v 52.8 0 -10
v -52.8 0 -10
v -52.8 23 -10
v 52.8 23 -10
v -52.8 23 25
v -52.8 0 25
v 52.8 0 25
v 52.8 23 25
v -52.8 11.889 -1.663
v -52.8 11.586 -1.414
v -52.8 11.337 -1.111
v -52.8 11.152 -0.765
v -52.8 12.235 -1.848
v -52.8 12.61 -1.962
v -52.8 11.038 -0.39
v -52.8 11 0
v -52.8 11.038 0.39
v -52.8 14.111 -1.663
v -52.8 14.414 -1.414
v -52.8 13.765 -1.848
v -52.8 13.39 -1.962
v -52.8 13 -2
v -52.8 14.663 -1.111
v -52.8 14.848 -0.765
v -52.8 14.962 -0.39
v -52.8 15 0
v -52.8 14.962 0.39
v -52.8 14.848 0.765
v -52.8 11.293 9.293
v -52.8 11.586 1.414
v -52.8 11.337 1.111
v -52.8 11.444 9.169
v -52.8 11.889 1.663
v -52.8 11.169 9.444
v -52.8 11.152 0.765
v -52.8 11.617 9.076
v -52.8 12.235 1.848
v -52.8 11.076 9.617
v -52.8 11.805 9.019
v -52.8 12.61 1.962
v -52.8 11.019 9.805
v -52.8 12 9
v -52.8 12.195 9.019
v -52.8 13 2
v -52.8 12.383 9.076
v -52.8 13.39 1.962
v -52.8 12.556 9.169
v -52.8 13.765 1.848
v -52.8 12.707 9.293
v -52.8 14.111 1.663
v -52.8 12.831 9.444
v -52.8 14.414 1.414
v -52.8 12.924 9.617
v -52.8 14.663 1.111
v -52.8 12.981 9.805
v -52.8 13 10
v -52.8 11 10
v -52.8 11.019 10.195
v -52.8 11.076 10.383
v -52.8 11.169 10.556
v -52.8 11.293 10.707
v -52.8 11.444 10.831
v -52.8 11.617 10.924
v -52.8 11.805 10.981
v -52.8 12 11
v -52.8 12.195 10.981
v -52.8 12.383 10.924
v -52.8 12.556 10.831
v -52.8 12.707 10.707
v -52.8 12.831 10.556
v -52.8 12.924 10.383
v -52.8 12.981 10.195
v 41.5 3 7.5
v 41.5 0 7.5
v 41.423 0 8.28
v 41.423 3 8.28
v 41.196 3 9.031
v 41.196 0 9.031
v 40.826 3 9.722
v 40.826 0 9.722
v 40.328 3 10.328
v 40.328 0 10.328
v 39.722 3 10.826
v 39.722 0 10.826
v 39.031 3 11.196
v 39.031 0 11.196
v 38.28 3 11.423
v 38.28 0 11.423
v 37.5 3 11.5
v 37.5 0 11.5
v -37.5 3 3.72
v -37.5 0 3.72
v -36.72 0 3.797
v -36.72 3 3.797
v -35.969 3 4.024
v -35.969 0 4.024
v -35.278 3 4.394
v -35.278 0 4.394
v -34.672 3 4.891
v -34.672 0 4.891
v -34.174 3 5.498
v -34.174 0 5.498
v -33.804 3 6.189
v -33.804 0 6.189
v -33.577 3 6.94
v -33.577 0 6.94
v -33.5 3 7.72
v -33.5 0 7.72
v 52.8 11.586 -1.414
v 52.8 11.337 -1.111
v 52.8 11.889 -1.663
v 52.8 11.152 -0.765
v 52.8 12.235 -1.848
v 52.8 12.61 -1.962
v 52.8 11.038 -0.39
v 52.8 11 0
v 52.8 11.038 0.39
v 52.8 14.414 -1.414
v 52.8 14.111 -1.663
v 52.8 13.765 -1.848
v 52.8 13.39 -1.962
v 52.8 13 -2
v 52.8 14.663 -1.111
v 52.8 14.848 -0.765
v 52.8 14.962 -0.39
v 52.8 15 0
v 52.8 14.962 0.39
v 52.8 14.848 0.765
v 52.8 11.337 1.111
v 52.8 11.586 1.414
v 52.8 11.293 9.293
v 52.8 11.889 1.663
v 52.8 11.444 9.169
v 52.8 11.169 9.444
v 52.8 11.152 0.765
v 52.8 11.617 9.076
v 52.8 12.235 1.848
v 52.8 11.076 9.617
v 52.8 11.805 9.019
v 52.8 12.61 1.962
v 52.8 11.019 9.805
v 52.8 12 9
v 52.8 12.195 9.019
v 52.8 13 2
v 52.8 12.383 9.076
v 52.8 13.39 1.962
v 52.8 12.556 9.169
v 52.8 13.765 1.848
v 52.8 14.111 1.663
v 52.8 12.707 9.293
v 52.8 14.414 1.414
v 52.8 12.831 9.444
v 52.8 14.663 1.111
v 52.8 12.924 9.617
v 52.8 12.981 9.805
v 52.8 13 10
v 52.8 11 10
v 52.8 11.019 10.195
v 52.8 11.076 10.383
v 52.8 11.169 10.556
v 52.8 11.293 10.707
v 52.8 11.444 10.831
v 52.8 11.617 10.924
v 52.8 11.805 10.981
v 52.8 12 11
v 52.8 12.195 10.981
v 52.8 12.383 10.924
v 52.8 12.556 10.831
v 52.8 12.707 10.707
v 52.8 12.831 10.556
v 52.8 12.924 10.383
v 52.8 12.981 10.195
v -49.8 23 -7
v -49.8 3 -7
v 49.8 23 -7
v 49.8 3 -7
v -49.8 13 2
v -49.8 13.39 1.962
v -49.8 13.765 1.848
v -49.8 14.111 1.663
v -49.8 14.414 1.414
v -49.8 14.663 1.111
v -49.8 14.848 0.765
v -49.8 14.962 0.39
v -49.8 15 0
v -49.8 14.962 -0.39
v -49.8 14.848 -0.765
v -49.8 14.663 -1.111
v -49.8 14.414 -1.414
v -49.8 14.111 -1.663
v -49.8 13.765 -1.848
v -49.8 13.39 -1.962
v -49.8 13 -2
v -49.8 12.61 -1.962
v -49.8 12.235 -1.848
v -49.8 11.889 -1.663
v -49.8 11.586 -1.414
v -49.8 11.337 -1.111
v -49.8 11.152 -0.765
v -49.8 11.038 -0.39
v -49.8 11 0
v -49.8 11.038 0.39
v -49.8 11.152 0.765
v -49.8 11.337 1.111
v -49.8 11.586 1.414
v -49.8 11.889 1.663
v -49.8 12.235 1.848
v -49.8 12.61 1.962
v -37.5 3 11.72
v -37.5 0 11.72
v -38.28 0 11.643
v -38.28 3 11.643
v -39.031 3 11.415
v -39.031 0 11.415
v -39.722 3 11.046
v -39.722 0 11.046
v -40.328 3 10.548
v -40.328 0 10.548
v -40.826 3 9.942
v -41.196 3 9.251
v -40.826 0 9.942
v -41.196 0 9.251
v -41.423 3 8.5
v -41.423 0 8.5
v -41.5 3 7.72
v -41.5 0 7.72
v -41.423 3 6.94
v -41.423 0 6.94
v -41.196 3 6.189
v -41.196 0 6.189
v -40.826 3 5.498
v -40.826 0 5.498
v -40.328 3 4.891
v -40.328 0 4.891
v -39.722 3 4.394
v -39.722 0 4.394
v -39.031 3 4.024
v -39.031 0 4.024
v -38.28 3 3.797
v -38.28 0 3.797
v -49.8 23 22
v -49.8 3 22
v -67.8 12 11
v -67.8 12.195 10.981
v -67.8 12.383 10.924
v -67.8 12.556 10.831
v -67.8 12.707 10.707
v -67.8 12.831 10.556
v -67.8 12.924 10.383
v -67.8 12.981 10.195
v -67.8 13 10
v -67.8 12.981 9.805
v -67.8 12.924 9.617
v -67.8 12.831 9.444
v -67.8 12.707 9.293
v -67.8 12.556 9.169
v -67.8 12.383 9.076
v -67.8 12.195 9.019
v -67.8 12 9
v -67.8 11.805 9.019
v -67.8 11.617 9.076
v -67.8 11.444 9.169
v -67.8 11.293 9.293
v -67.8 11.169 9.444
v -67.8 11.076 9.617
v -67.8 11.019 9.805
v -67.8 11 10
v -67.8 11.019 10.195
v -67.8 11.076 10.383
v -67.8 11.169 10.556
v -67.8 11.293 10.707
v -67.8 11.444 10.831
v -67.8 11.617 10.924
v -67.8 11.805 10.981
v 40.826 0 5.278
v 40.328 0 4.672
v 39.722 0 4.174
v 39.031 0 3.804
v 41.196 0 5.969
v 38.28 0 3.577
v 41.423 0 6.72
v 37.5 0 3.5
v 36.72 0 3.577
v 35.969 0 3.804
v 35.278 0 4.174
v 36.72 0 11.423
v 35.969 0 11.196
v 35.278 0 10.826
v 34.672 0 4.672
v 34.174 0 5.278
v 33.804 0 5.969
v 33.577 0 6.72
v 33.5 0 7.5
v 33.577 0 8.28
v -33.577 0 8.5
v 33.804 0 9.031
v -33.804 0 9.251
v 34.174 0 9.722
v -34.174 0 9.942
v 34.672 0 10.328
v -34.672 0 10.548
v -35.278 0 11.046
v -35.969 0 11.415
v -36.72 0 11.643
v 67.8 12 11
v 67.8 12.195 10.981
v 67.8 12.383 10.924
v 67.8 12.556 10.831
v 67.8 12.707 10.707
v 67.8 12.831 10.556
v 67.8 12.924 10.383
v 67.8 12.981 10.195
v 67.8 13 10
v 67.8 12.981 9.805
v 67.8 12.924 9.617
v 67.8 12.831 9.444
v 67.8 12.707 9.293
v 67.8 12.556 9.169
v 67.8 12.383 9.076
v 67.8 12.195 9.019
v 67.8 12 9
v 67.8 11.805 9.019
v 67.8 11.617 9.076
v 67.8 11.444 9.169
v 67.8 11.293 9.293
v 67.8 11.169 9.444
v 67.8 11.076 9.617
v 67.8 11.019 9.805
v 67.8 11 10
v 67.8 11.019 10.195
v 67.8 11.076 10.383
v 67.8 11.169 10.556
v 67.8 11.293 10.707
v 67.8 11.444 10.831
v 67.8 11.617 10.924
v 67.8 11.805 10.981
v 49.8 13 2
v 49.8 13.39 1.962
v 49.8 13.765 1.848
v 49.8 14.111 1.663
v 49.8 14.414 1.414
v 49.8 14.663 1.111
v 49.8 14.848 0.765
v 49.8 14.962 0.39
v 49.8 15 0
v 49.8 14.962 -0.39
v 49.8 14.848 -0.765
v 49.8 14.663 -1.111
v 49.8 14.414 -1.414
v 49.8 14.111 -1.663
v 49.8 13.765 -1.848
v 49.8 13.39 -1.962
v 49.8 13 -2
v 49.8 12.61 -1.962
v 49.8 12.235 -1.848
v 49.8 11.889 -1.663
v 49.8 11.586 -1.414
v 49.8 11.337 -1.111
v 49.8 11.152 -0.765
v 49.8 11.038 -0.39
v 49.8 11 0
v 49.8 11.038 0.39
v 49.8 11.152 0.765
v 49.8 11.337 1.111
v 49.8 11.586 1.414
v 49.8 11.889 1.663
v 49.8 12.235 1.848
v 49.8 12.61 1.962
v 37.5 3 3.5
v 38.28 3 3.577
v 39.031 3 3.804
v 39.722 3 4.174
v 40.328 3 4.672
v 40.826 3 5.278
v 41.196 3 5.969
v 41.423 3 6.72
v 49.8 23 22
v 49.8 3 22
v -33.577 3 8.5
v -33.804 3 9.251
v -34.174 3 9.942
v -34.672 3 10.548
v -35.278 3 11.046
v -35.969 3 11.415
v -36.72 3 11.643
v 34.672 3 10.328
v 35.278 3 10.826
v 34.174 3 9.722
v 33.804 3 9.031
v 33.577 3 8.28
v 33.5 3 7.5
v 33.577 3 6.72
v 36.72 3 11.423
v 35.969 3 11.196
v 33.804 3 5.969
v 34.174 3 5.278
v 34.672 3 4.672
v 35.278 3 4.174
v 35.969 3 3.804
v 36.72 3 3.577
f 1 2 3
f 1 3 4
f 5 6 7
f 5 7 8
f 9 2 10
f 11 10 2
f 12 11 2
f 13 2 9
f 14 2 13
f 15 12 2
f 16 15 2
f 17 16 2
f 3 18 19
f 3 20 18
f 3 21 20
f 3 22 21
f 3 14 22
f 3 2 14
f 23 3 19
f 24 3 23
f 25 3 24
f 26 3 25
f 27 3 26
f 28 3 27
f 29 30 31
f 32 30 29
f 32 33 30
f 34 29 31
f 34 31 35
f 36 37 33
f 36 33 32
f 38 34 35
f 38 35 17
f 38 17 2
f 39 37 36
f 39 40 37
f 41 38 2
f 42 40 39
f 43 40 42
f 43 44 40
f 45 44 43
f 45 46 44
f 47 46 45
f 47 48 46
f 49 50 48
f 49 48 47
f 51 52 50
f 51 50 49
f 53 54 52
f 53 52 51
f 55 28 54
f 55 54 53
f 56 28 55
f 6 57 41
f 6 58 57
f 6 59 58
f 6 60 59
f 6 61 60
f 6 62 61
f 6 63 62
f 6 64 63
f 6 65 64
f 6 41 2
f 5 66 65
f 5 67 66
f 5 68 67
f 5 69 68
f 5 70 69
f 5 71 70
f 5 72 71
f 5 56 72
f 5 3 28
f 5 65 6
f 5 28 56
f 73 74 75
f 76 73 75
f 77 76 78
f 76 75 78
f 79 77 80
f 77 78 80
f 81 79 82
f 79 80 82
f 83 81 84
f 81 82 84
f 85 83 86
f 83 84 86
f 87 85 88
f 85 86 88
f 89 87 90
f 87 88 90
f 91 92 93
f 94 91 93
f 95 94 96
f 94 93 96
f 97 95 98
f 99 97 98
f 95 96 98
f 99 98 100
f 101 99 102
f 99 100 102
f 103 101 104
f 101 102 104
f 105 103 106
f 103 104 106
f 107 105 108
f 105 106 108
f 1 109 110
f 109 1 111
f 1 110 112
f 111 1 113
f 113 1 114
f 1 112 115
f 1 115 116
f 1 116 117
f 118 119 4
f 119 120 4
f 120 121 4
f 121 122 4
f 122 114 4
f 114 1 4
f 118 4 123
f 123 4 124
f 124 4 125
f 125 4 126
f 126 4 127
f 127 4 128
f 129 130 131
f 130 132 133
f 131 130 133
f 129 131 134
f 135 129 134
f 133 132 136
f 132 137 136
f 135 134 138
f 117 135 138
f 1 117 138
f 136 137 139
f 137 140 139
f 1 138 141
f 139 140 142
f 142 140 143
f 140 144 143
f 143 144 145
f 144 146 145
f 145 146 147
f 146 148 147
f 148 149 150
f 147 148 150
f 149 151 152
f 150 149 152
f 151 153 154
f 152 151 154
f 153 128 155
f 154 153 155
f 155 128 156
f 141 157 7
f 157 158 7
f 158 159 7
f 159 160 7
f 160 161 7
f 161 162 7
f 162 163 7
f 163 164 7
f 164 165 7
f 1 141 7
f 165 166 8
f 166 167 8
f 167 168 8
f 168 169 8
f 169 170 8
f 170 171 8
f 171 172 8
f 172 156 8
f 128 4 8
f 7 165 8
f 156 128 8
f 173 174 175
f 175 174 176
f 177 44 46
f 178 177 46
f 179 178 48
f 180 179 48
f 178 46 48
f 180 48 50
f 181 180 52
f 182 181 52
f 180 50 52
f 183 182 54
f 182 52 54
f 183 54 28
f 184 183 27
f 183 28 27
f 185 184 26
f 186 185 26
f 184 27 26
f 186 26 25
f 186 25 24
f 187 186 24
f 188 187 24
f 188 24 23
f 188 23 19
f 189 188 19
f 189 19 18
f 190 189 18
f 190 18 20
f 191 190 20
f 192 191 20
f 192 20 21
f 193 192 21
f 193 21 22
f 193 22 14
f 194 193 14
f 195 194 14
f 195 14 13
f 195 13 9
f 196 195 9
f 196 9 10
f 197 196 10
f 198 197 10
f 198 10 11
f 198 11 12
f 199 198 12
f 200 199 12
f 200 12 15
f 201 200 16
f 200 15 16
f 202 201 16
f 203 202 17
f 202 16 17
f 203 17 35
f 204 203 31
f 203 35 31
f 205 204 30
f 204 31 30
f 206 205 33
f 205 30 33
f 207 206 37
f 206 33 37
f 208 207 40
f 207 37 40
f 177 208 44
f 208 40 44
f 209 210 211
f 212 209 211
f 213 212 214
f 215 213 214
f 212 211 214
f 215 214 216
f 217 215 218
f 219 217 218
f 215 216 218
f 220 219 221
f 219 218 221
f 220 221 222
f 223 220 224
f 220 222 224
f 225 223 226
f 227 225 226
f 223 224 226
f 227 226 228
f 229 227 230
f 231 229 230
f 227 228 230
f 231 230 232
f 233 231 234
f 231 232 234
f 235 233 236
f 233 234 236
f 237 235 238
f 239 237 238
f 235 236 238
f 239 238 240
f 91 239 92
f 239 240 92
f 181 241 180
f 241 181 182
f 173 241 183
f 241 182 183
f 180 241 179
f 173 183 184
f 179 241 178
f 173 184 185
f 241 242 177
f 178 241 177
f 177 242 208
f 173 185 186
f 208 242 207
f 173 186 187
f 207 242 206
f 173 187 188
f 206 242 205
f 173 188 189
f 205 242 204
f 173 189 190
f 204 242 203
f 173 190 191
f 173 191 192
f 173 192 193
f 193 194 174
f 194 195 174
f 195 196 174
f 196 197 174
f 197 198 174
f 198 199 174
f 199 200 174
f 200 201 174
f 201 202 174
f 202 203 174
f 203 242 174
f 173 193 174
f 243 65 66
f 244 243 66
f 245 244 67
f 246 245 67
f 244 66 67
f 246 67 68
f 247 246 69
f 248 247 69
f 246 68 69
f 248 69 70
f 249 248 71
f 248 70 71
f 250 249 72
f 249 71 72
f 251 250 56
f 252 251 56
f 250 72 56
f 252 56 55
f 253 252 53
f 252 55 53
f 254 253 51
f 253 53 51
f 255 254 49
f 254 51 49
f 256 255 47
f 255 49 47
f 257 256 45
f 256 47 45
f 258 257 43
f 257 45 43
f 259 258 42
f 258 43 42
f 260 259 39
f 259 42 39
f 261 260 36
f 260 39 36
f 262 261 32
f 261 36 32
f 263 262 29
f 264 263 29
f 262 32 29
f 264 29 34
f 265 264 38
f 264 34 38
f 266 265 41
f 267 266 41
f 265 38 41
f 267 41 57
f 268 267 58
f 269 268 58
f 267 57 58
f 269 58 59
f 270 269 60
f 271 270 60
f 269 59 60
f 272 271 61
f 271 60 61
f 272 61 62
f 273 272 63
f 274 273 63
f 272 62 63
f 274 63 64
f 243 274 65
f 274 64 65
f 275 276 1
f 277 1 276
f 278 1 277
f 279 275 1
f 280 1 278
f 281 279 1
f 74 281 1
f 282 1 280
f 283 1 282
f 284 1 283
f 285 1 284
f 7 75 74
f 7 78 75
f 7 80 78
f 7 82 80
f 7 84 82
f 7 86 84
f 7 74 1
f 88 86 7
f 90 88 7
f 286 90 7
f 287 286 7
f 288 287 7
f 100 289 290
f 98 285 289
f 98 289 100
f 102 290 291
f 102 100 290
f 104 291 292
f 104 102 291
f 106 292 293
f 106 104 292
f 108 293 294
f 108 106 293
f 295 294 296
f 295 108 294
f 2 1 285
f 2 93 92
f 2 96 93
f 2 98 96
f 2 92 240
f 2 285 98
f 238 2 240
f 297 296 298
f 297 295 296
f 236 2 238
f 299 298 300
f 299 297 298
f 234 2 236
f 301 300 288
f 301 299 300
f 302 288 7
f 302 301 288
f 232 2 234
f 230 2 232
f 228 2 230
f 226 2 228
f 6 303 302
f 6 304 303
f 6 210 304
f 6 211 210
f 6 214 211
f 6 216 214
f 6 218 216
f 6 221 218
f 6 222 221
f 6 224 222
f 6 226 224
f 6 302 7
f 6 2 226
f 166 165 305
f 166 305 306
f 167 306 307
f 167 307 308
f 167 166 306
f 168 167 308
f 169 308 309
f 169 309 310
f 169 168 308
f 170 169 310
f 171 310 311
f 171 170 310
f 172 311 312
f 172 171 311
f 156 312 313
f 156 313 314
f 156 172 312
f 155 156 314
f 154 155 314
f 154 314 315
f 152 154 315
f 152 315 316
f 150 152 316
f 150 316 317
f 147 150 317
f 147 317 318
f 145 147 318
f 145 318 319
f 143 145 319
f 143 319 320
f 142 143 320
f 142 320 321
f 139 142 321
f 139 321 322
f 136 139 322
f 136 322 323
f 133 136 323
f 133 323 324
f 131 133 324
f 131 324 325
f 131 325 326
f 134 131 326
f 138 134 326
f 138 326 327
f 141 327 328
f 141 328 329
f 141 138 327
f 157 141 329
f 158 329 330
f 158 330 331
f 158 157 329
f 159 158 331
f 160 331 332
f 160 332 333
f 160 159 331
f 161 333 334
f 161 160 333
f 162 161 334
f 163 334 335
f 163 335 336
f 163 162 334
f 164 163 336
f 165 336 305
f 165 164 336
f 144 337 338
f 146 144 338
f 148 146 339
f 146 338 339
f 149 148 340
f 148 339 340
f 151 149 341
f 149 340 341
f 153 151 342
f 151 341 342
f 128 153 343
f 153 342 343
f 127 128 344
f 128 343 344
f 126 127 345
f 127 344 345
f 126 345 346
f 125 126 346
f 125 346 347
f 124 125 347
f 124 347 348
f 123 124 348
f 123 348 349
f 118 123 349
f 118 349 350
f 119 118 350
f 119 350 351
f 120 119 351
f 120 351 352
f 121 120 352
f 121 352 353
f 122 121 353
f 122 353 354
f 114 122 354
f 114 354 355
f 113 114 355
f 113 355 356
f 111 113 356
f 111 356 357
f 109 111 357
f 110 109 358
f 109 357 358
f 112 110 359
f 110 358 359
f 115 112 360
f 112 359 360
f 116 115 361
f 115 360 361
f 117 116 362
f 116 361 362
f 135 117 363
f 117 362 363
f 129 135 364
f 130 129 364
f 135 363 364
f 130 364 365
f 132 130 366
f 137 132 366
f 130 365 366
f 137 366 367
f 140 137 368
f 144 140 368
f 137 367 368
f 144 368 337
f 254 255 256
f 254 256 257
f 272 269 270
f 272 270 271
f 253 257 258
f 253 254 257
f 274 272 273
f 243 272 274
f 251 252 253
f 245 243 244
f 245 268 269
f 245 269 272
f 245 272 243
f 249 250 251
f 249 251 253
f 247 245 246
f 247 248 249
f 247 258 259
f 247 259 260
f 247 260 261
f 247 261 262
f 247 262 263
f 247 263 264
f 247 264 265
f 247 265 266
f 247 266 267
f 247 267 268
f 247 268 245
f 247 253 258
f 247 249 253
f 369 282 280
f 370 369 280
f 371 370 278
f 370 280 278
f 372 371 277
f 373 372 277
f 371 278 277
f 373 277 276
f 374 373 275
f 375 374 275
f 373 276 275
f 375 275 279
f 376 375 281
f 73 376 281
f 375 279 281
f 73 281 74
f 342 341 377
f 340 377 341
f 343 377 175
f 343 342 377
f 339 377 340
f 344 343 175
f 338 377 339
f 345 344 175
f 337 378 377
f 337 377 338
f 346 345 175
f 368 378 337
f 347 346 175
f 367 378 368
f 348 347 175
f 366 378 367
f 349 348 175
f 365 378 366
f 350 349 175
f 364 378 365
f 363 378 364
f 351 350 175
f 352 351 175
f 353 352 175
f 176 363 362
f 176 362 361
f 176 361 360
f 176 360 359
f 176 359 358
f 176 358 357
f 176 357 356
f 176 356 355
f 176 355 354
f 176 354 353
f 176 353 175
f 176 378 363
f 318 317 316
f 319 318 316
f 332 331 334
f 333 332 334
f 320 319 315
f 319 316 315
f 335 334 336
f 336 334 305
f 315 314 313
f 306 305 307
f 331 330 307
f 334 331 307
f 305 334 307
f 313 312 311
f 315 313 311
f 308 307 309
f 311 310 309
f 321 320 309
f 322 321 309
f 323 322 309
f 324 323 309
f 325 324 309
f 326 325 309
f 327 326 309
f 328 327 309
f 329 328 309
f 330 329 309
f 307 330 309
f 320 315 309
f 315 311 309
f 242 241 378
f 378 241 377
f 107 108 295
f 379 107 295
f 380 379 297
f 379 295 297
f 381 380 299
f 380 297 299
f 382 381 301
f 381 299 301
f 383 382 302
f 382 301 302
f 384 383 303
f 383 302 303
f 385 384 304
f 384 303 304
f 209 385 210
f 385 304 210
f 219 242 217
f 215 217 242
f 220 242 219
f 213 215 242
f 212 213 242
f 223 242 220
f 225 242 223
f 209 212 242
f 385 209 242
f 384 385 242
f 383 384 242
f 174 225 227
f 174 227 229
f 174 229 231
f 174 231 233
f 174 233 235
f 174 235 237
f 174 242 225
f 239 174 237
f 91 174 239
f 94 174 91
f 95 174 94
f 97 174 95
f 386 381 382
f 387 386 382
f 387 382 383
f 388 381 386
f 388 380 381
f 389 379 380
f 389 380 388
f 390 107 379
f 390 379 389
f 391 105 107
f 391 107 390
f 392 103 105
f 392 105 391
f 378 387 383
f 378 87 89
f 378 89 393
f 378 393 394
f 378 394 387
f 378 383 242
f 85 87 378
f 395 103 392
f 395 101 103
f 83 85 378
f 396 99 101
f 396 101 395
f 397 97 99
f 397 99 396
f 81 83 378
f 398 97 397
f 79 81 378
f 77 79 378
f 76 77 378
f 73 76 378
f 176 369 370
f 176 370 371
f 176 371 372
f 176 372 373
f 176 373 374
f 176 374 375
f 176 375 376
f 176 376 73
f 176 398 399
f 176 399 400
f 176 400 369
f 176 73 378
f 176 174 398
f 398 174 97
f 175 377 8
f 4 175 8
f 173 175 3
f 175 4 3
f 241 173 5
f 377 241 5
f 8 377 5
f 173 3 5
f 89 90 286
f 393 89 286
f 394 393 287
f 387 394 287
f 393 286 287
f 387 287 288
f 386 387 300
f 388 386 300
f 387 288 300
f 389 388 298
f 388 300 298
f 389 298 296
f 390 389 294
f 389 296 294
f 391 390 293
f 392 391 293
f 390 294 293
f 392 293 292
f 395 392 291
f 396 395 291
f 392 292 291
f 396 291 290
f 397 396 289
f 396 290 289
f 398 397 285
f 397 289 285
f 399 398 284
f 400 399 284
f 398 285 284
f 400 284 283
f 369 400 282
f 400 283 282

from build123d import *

# Parameters (mm, degrees)
SKETCH_1_W           = 105.6
SKETCH_1_H           = 20
EXTRUDE_1_DEPTH      = 3
SKETCH_10_W          = 105.6
SKETCH_10_H          = 20
SKETCH_10_W_2        = 99.6
SKETCH_10_H_2        = 14
EXTRUDE_2_DEPTH      = 20
SKETCH_11_R          = 2
CUT_EXTRUDE_1_DEPTH  = 110
SKETCH_12_W          = 15
SKETCH_12_H          = 23
EXTRUDE_3_DEPTH      = 105.6
SKETCH_14_W          = 99.6
SKETCH_14_H          = 15
CUT_EXTRUDE_2_DEPTH  = 20
CUT_EXTRUDE_3_DEPTH  = 20
SKETCH_17_R          = 1
EXTRUDE_4_DEPTH      = 15
EXTRUDE_4_DEPTH_BACK = 120.6
SKETCH_19_W          = 99.6
SKETCH_19_H          = 29
CUT_EXTRUDE_4_DEPTH  = 10


with BuildPart() as part:
    # 草图1 → 凸台-拉伸1 (new body)
    with BuildSketch(Plane(origin=(0, 0, 0), x_dir=(1, 0, 0), z_dir=(0, 1, 0))):
        Rectangle(SKETCH_1_W, SKETCH_1_H)
    extrude(amount=EXTRUDE_1_DEPTH)

    # 草图10 → 凸台-拉伸2 (add)
    with BuildSketch(Plane(origin=(0, 3, 0), x_dir=(1, 0, 0), z_dir=(0, 1, 0))):
        Rectangle(SKETCH_10_W, SKETCH_10_H)
        Rectangle(SKETCH_10_W_2, SKETCH_10_H_2, mode=Mode.SUBTRACT)
    extrude(amount=EXTRUDE_2_DEPTH)

    # 草图11 → 切除-拉伸1 (cut)
    with BuildSketch(Plane.ZY.offset(52.8)):
        with Locations((0, 13)):
            Circle(SKETCH_11_R)
    extrude(amount=-CUT_EXTRUDE_1_DEPTH, mode=Mode.SUBTRACT)

    # 草图12 → 凸台-拉伸3 (add)
    with BuildSketch(Plane.ZY.offset(52.8)):
        with Locations((17.5, 11.5)):
            Rectangle(SKETCH_12_W, SKETCH_12_H)
    extrude(amount=-EXTRUDE_3_DEPTH)

    # 草图14 → 切除-拉伸2 (cut)
    with BuildSketch(Plane(origin=(0, 23, 0), x_dir=(1, 0, 0), z_dir=(0, 1, 0))):
        with Locations((0, -14.5)):
            Rectangle(SKETCH_14_W, SKETCH_14_H)
    extrude(amount=-CUT_EXTRUDE_2_DEPTH, mode=Mode.SUBTRACT)

    # 草图16 → 切除-拉伸3 (cut)
    with BuildSketch(Plane.XZ):
        with BuildLine():
            ThreePointArc((-33.5, 7.719862672), (-34.671572875, 10.548289796), (-37.5, 11.719862672))
            Line((-37.5, 11.719862672), (-37.5, 3.719862672))
            ThreePointArc((-37.5, 3.719862672), (-34.671572875, 4.891435547), (-33.5, 7.719862672))
        make_face()
        with BuildLine():
            Line((-37.5, 3.719862672), (-37.5, 11.719862672))
            ThreePointArc((-37.5, 11.719862672), (-41.5, 7.719862672), (-37.5, 3.719862672))
        make_face()
        with BuildLine():
            ThreePointArc((41.5, 7.5), (40.328427125, 10.328427125), (37.5, 11.5))
            Line((37.5, 11.5), (37.5, 3.5))
            ThreePointArc((37.5, 3.5), (40.328427125, 4.671572875), (41.5, 7.5))
        make_face()
        with BuildLine():
            Line((37.5, 3.5), (37.5, 11.5))
            ThreePointArc((37.5, 11.5), (33.5, 7.5), (37.5, 3.5))
        make_face()
    extrude(amount=-CUT_EXTRUDE_3_DEPTH, mode=Mode.SUBTRACT)

    # 草图17 → 凸台-拉伸4 (add, two sides)
    with BuildSketch(Plane.ZY.offset(52.8)) as extrude_4_sk:
        with Locations((10, 12)):
            Circle(SKETCH_17_R)
    extrude(amount=EXTRUDE_4_DEPTH)
    extrude(extrude_4_sk.sketch, amount=-EXTRUDE_4_DEPTH_BACK)

    # 草图19 → 切除-拉伸4 (cut)
    with BuildSketch(Plane(origin=(0, 3, 0), x_dir=(1, 0, 0), z_dir=(0, 1, 0))):
        with Locations((0, -7.5)):
            Rectangle(SKETCH_19_W, SKETCH_19_H)
    extrude(amount=CUT_EXTRUDE_4_DEPTH, mode=Mode.SUBTRACT)


solid = part.part
